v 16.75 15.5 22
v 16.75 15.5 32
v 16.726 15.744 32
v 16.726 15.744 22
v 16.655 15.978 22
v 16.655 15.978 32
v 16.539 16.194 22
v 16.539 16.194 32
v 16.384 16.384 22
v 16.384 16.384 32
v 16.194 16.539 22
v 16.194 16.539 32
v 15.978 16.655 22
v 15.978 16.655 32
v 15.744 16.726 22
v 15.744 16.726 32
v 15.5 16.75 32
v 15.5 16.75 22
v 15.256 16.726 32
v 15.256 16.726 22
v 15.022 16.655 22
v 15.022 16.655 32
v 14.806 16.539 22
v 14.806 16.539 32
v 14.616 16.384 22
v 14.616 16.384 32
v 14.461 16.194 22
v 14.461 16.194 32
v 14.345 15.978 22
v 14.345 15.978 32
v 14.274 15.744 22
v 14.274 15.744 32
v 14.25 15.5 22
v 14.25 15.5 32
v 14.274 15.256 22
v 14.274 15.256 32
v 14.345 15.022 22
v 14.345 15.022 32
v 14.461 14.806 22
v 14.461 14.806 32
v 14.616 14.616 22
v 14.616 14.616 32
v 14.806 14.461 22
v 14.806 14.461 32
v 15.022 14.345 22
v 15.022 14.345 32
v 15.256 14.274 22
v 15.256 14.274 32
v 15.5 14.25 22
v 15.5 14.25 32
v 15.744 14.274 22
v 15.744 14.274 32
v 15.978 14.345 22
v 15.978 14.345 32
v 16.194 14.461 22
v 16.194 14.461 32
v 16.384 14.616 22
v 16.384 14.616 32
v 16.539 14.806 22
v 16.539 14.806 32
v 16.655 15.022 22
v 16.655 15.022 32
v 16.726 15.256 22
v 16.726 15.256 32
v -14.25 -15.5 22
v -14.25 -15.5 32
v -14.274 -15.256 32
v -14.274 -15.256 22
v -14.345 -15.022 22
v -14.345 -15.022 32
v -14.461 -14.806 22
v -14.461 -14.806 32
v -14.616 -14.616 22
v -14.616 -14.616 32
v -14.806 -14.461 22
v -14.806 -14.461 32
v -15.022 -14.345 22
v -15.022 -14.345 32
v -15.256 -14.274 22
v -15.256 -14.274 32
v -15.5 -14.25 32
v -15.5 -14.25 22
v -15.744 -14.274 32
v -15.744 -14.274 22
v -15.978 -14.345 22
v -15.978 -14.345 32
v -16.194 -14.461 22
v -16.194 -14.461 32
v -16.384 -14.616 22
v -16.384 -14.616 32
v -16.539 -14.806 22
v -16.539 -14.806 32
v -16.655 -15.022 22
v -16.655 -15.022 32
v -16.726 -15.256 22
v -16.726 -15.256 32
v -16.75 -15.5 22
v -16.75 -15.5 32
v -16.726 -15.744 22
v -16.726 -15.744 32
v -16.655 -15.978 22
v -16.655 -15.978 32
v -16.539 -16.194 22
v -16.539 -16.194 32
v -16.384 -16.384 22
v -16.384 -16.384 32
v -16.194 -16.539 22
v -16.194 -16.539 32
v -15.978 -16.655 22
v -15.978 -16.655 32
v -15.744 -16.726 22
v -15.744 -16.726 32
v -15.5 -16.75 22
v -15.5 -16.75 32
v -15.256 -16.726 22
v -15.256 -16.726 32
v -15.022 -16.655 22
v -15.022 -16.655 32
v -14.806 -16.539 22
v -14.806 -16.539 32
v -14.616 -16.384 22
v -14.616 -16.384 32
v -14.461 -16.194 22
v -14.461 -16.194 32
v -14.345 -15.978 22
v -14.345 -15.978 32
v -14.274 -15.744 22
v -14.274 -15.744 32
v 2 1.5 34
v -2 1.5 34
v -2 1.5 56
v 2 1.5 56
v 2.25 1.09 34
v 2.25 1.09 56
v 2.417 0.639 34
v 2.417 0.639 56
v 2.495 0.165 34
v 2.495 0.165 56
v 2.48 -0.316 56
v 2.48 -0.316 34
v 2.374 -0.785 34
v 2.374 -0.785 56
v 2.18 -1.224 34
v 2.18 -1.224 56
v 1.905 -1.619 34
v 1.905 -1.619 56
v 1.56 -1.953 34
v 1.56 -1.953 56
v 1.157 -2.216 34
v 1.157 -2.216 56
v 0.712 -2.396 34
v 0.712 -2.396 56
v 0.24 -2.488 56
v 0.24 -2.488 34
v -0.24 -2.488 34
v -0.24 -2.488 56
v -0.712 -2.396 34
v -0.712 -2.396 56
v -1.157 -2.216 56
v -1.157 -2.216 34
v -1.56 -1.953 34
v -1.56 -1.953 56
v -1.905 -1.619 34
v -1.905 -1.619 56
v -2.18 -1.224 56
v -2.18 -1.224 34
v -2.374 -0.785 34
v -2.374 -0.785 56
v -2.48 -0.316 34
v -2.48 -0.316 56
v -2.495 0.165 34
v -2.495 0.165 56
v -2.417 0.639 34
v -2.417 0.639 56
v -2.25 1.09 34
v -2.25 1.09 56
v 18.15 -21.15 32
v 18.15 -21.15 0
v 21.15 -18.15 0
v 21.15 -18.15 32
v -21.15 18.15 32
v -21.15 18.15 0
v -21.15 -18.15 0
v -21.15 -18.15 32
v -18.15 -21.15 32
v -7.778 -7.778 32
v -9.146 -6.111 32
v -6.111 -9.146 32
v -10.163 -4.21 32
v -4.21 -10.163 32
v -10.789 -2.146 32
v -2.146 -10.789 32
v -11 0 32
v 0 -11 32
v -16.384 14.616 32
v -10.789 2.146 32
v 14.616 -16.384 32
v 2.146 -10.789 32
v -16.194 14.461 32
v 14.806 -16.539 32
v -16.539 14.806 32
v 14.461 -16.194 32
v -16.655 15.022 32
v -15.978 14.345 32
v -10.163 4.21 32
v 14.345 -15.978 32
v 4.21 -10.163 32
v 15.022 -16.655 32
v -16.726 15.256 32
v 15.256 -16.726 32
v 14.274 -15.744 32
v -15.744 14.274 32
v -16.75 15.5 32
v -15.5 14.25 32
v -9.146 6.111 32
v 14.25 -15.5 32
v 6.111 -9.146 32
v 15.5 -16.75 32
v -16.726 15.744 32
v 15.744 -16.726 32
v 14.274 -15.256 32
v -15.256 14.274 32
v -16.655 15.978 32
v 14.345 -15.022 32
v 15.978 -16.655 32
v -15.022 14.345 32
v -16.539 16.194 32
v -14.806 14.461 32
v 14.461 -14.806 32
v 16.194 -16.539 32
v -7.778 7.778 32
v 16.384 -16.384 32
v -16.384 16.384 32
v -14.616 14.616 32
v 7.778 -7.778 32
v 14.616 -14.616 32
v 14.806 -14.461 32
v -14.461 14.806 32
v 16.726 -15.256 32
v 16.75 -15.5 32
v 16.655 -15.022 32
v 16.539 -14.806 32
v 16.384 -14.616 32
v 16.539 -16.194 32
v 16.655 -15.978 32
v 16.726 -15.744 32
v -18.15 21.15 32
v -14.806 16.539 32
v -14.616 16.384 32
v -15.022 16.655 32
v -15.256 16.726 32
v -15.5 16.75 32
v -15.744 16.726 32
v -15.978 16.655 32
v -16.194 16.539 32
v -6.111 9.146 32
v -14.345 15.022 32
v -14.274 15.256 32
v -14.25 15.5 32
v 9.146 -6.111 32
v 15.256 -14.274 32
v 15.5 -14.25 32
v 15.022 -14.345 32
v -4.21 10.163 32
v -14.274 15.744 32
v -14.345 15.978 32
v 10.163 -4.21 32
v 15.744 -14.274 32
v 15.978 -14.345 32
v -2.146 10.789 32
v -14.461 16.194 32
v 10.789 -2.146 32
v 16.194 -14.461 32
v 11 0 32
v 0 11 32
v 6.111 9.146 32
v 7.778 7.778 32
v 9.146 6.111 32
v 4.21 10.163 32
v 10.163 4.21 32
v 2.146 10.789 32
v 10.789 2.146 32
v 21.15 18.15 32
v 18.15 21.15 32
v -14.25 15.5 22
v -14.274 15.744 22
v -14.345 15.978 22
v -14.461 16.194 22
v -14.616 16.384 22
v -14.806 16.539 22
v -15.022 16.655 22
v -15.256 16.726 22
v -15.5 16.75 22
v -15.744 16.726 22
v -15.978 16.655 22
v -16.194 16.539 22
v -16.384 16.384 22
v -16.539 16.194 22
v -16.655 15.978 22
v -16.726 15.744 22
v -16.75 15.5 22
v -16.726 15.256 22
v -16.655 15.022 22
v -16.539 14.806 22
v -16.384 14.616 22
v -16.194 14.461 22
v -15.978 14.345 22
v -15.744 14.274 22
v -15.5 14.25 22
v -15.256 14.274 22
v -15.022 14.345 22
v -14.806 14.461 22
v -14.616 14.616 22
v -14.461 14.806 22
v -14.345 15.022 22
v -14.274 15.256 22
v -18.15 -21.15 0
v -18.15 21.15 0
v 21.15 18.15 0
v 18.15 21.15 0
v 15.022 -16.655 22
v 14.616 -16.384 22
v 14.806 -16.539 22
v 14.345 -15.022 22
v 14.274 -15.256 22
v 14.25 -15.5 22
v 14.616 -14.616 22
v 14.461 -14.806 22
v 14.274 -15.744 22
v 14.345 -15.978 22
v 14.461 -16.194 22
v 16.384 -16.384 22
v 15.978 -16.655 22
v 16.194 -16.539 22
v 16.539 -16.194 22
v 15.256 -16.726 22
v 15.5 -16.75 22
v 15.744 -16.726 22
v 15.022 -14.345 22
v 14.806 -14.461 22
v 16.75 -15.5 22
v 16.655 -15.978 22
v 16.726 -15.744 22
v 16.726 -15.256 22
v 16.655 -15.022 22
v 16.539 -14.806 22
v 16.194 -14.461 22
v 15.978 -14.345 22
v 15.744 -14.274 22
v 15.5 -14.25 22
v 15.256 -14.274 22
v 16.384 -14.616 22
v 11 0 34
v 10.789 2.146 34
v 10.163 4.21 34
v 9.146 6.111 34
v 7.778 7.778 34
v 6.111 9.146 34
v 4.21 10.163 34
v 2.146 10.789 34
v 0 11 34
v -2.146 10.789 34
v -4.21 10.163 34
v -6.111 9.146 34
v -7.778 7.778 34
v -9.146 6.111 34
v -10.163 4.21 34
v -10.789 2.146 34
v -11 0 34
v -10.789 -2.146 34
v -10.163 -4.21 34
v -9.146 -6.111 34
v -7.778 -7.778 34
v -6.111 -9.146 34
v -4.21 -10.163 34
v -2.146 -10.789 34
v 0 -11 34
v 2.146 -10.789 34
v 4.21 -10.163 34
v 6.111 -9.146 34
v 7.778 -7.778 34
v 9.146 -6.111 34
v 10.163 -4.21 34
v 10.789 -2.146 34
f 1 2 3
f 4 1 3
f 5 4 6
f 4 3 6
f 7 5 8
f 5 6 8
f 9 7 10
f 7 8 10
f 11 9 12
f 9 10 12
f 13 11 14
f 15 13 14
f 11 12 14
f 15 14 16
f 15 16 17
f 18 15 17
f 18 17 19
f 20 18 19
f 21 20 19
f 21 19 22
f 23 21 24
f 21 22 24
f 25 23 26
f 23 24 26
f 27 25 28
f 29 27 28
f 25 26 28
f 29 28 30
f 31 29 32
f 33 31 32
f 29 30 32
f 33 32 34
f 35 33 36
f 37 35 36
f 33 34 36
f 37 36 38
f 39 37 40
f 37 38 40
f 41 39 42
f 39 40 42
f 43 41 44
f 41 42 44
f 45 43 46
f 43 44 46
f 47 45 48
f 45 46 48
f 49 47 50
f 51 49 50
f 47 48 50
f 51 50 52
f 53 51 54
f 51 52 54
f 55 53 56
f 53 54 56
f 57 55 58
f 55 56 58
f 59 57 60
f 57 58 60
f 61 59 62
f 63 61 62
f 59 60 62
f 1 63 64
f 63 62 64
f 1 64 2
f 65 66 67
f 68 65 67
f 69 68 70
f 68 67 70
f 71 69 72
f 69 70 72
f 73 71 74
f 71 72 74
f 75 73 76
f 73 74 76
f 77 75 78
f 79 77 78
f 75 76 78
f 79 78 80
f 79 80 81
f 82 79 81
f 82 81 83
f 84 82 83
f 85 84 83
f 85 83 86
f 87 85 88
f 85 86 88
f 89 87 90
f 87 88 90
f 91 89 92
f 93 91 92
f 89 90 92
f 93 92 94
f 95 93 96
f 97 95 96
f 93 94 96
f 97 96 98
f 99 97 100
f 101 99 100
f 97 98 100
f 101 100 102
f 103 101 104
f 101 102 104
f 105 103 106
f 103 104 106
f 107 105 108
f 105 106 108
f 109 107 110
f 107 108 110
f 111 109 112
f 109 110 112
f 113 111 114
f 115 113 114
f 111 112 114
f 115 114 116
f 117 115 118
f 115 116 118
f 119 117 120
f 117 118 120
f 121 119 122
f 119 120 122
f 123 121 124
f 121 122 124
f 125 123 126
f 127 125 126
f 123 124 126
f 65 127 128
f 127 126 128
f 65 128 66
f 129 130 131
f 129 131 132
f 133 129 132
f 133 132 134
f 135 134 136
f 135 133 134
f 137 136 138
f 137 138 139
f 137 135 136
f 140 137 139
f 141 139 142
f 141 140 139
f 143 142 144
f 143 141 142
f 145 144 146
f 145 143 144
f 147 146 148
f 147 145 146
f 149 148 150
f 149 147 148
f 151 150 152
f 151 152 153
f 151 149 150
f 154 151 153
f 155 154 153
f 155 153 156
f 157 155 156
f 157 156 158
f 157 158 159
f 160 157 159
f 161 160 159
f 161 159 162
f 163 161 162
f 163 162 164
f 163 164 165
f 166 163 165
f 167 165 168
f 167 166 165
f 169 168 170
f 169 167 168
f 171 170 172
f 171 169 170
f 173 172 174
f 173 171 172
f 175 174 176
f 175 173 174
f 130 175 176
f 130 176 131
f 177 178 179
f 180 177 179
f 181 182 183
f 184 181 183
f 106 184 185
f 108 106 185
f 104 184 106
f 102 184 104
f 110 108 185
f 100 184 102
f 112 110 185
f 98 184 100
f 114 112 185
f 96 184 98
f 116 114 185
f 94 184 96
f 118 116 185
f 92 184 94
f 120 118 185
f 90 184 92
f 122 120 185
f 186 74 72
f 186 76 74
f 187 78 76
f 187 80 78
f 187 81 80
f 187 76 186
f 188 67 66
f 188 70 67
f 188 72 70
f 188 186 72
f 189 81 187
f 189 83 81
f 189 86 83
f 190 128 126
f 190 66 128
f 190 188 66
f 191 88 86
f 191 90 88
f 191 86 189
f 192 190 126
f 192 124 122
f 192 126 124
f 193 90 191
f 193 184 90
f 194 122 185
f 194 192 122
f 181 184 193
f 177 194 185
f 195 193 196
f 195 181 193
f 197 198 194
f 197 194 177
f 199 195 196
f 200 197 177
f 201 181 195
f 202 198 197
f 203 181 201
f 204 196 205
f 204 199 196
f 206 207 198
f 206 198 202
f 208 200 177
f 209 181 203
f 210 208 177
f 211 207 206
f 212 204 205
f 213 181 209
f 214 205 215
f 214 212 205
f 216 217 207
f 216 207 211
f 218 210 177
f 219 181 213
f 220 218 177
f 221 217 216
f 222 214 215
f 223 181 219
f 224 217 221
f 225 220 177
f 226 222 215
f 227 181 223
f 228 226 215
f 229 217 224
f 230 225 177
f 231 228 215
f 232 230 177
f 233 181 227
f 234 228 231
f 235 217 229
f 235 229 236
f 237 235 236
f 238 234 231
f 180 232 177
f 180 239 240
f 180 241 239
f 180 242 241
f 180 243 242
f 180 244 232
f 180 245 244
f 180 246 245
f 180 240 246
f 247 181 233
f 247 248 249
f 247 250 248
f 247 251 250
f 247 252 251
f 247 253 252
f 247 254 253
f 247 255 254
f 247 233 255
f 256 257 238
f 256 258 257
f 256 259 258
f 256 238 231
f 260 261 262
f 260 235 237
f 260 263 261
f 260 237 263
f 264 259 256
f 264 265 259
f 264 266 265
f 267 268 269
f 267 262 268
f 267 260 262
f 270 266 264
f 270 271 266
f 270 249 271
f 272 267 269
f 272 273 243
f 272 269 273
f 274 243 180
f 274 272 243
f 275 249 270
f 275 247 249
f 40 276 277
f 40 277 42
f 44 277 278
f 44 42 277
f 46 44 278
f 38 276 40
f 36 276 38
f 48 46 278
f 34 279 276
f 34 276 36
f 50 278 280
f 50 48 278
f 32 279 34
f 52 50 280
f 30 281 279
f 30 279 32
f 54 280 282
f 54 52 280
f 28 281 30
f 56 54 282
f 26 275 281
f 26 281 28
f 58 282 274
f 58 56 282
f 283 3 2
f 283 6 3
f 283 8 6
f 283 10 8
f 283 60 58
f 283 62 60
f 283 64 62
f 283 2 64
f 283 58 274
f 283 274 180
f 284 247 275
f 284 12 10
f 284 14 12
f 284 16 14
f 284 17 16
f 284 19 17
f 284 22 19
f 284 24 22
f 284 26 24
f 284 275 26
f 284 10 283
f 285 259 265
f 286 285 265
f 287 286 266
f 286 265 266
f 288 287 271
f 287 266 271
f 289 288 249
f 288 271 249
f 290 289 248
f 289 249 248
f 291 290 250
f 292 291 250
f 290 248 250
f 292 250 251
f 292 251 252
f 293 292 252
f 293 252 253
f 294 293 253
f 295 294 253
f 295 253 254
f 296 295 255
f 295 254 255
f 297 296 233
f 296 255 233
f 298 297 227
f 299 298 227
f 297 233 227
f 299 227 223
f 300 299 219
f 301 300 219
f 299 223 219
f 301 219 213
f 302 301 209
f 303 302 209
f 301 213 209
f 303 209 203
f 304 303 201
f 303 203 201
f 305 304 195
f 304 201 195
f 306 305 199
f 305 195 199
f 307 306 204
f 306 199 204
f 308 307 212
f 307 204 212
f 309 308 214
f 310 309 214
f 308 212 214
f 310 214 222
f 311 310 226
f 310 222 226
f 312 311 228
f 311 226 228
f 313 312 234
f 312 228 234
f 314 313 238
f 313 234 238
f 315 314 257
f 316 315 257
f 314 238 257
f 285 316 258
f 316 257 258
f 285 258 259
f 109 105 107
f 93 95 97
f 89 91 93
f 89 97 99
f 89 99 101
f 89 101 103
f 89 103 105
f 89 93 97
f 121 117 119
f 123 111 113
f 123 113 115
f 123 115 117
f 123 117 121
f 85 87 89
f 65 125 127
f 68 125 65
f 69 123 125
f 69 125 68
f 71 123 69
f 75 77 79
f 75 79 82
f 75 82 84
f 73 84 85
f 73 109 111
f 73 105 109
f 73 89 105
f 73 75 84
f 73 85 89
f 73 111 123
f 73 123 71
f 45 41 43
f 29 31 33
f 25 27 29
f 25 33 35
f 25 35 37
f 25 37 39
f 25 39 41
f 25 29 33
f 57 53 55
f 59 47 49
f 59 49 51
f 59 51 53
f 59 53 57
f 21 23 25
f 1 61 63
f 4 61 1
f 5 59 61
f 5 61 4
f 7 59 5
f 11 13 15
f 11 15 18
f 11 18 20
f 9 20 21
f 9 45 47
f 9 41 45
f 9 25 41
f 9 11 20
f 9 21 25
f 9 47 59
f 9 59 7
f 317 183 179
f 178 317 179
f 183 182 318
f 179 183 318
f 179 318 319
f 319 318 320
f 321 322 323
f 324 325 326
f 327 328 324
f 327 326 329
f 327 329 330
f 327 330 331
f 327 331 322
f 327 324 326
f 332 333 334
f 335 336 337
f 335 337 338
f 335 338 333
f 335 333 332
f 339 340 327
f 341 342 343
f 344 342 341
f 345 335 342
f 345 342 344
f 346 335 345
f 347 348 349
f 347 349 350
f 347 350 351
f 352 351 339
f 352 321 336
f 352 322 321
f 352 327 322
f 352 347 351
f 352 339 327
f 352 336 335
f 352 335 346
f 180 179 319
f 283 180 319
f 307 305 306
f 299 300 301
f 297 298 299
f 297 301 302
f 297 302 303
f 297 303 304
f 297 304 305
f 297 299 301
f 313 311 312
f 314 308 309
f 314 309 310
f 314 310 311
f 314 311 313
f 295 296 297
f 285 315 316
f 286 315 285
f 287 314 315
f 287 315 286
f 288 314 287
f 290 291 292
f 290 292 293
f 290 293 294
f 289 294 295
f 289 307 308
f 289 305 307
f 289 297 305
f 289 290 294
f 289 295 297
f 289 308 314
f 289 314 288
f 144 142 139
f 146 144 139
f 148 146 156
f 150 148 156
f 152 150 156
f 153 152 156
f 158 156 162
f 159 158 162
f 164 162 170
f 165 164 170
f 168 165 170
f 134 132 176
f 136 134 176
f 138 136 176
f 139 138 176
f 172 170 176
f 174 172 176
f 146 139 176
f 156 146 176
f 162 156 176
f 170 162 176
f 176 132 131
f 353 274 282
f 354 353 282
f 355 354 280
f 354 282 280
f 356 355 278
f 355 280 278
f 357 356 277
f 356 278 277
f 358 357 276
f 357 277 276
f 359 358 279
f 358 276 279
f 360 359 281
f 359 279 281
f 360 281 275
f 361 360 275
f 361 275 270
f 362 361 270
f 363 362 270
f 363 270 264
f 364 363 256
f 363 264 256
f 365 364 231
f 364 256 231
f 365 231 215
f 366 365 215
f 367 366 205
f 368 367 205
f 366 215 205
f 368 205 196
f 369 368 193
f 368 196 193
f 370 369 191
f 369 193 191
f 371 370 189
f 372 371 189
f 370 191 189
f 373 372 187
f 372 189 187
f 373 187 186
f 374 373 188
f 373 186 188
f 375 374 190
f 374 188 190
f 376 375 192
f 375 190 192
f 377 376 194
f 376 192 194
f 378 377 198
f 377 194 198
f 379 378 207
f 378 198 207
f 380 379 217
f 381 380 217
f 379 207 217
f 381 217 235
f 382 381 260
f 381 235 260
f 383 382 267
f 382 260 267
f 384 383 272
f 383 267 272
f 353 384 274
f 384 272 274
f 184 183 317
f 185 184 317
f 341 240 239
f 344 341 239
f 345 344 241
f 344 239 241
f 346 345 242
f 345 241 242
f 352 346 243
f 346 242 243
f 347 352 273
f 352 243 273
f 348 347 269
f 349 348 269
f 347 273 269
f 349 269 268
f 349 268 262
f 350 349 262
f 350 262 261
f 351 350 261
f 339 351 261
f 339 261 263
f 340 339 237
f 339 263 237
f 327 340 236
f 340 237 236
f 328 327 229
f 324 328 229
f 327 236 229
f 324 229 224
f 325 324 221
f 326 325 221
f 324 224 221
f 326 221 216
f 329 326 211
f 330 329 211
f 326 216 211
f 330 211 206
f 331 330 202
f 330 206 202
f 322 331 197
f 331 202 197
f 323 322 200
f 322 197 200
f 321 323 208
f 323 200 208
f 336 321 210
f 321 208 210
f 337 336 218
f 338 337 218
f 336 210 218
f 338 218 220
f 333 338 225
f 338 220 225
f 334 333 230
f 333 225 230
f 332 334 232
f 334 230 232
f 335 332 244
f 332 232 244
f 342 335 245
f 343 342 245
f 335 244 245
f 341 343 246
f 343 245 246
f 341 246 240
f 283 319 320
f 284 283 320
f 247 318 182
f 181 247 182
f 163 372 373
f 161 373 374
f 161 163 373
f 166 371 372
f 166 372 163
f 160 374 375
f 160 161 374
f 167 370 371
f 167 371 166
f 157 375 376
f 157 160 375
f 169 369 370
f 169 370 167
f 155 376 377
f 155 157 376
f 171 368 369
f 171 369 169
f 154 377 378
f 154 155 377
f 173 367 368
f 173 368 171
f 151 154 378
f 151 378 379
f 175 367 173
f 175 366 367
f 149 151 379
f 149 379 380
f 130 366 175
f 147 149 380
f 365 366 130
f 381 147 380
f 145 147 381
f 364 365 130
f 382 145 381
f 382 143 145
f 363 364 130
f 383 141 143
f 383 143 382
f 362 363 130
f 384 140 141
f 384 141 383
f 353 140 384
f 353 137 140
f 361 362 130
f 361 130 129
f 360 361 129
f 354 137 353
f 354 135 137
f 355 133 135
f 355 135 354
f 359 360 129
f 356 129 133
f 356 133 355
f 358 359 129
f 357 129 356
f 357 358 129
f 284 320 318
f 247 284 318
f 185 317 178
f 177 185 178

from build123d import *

# Parameters (mm, degrees)
BOSS_EXTRU_1_DEPTH      = 32
ESQUISSE2_R             = 11
BOSS_EXTRU_2_DEPTH      = 2
BOSS_EXTRU_3_DEPTH      = 22
ESQUISSE4_R             = 1.25
ENL_V_MAT_EXTRU_1_DEPTH = 10


with BuildPart() as part:
    # Esquisse1 → Boss.-Extru.1 (new body)
    with BuildSketch(Plane.XY):
        Polygon((21.15, 18.15), (18.15, 21.15), (-18.15, 21.15), (-21.15, 18.15), (-21.15, -18.15), (-18.15, -21.15), (18.15, -21.15), (21.15, -18.15), align=None)
    extrude(amount=BOSS_EXTRU_1_DEPTH)

    # Esquisse2 → Boss.-Extru.2 (add)
    with BuildSketch(Plane.XY.offset(32)):
        Circle(ESQUISSE2_R)
    extrude(amount=BOSS_EXTRU_2_DEPTH)

    # Esquisse3 → Boss.-Extru.3 (add)
    with BuildSketch(Plane.XY.offset(34)):
        with BuildLine():
            Line((-2, 1.5), (2, 1.5))
            ThreePointArc((2, 1.5), (0, -2.5), (-2, 1.5))
        make_face()
    extrude(amount=BOSS_EXTRU_3_DEPTH)

    # Esquisse4 → Enlèv. mat.-Extru.1 (cut)
    with BuildSketch(Plane.XY.offset(32)):
        with Locations((-15.5, 15.5)):
            Circle(ESQUISSE4_R)
        with Locations((15.5, 15.5)):
            Circle(ESQUISSE4_R)
        with Locations((15.5, -15.5)):
            Circle(ESQUISSE4_R)
        with Locations((-15.5, -15.5)):
            Circle(ESQUISSE4_R)
    extrude(amount=-ENL_V_MAT_EXTRU_1_DEPTH, mode=Mode.SUBTRACT)


solid = part.part
